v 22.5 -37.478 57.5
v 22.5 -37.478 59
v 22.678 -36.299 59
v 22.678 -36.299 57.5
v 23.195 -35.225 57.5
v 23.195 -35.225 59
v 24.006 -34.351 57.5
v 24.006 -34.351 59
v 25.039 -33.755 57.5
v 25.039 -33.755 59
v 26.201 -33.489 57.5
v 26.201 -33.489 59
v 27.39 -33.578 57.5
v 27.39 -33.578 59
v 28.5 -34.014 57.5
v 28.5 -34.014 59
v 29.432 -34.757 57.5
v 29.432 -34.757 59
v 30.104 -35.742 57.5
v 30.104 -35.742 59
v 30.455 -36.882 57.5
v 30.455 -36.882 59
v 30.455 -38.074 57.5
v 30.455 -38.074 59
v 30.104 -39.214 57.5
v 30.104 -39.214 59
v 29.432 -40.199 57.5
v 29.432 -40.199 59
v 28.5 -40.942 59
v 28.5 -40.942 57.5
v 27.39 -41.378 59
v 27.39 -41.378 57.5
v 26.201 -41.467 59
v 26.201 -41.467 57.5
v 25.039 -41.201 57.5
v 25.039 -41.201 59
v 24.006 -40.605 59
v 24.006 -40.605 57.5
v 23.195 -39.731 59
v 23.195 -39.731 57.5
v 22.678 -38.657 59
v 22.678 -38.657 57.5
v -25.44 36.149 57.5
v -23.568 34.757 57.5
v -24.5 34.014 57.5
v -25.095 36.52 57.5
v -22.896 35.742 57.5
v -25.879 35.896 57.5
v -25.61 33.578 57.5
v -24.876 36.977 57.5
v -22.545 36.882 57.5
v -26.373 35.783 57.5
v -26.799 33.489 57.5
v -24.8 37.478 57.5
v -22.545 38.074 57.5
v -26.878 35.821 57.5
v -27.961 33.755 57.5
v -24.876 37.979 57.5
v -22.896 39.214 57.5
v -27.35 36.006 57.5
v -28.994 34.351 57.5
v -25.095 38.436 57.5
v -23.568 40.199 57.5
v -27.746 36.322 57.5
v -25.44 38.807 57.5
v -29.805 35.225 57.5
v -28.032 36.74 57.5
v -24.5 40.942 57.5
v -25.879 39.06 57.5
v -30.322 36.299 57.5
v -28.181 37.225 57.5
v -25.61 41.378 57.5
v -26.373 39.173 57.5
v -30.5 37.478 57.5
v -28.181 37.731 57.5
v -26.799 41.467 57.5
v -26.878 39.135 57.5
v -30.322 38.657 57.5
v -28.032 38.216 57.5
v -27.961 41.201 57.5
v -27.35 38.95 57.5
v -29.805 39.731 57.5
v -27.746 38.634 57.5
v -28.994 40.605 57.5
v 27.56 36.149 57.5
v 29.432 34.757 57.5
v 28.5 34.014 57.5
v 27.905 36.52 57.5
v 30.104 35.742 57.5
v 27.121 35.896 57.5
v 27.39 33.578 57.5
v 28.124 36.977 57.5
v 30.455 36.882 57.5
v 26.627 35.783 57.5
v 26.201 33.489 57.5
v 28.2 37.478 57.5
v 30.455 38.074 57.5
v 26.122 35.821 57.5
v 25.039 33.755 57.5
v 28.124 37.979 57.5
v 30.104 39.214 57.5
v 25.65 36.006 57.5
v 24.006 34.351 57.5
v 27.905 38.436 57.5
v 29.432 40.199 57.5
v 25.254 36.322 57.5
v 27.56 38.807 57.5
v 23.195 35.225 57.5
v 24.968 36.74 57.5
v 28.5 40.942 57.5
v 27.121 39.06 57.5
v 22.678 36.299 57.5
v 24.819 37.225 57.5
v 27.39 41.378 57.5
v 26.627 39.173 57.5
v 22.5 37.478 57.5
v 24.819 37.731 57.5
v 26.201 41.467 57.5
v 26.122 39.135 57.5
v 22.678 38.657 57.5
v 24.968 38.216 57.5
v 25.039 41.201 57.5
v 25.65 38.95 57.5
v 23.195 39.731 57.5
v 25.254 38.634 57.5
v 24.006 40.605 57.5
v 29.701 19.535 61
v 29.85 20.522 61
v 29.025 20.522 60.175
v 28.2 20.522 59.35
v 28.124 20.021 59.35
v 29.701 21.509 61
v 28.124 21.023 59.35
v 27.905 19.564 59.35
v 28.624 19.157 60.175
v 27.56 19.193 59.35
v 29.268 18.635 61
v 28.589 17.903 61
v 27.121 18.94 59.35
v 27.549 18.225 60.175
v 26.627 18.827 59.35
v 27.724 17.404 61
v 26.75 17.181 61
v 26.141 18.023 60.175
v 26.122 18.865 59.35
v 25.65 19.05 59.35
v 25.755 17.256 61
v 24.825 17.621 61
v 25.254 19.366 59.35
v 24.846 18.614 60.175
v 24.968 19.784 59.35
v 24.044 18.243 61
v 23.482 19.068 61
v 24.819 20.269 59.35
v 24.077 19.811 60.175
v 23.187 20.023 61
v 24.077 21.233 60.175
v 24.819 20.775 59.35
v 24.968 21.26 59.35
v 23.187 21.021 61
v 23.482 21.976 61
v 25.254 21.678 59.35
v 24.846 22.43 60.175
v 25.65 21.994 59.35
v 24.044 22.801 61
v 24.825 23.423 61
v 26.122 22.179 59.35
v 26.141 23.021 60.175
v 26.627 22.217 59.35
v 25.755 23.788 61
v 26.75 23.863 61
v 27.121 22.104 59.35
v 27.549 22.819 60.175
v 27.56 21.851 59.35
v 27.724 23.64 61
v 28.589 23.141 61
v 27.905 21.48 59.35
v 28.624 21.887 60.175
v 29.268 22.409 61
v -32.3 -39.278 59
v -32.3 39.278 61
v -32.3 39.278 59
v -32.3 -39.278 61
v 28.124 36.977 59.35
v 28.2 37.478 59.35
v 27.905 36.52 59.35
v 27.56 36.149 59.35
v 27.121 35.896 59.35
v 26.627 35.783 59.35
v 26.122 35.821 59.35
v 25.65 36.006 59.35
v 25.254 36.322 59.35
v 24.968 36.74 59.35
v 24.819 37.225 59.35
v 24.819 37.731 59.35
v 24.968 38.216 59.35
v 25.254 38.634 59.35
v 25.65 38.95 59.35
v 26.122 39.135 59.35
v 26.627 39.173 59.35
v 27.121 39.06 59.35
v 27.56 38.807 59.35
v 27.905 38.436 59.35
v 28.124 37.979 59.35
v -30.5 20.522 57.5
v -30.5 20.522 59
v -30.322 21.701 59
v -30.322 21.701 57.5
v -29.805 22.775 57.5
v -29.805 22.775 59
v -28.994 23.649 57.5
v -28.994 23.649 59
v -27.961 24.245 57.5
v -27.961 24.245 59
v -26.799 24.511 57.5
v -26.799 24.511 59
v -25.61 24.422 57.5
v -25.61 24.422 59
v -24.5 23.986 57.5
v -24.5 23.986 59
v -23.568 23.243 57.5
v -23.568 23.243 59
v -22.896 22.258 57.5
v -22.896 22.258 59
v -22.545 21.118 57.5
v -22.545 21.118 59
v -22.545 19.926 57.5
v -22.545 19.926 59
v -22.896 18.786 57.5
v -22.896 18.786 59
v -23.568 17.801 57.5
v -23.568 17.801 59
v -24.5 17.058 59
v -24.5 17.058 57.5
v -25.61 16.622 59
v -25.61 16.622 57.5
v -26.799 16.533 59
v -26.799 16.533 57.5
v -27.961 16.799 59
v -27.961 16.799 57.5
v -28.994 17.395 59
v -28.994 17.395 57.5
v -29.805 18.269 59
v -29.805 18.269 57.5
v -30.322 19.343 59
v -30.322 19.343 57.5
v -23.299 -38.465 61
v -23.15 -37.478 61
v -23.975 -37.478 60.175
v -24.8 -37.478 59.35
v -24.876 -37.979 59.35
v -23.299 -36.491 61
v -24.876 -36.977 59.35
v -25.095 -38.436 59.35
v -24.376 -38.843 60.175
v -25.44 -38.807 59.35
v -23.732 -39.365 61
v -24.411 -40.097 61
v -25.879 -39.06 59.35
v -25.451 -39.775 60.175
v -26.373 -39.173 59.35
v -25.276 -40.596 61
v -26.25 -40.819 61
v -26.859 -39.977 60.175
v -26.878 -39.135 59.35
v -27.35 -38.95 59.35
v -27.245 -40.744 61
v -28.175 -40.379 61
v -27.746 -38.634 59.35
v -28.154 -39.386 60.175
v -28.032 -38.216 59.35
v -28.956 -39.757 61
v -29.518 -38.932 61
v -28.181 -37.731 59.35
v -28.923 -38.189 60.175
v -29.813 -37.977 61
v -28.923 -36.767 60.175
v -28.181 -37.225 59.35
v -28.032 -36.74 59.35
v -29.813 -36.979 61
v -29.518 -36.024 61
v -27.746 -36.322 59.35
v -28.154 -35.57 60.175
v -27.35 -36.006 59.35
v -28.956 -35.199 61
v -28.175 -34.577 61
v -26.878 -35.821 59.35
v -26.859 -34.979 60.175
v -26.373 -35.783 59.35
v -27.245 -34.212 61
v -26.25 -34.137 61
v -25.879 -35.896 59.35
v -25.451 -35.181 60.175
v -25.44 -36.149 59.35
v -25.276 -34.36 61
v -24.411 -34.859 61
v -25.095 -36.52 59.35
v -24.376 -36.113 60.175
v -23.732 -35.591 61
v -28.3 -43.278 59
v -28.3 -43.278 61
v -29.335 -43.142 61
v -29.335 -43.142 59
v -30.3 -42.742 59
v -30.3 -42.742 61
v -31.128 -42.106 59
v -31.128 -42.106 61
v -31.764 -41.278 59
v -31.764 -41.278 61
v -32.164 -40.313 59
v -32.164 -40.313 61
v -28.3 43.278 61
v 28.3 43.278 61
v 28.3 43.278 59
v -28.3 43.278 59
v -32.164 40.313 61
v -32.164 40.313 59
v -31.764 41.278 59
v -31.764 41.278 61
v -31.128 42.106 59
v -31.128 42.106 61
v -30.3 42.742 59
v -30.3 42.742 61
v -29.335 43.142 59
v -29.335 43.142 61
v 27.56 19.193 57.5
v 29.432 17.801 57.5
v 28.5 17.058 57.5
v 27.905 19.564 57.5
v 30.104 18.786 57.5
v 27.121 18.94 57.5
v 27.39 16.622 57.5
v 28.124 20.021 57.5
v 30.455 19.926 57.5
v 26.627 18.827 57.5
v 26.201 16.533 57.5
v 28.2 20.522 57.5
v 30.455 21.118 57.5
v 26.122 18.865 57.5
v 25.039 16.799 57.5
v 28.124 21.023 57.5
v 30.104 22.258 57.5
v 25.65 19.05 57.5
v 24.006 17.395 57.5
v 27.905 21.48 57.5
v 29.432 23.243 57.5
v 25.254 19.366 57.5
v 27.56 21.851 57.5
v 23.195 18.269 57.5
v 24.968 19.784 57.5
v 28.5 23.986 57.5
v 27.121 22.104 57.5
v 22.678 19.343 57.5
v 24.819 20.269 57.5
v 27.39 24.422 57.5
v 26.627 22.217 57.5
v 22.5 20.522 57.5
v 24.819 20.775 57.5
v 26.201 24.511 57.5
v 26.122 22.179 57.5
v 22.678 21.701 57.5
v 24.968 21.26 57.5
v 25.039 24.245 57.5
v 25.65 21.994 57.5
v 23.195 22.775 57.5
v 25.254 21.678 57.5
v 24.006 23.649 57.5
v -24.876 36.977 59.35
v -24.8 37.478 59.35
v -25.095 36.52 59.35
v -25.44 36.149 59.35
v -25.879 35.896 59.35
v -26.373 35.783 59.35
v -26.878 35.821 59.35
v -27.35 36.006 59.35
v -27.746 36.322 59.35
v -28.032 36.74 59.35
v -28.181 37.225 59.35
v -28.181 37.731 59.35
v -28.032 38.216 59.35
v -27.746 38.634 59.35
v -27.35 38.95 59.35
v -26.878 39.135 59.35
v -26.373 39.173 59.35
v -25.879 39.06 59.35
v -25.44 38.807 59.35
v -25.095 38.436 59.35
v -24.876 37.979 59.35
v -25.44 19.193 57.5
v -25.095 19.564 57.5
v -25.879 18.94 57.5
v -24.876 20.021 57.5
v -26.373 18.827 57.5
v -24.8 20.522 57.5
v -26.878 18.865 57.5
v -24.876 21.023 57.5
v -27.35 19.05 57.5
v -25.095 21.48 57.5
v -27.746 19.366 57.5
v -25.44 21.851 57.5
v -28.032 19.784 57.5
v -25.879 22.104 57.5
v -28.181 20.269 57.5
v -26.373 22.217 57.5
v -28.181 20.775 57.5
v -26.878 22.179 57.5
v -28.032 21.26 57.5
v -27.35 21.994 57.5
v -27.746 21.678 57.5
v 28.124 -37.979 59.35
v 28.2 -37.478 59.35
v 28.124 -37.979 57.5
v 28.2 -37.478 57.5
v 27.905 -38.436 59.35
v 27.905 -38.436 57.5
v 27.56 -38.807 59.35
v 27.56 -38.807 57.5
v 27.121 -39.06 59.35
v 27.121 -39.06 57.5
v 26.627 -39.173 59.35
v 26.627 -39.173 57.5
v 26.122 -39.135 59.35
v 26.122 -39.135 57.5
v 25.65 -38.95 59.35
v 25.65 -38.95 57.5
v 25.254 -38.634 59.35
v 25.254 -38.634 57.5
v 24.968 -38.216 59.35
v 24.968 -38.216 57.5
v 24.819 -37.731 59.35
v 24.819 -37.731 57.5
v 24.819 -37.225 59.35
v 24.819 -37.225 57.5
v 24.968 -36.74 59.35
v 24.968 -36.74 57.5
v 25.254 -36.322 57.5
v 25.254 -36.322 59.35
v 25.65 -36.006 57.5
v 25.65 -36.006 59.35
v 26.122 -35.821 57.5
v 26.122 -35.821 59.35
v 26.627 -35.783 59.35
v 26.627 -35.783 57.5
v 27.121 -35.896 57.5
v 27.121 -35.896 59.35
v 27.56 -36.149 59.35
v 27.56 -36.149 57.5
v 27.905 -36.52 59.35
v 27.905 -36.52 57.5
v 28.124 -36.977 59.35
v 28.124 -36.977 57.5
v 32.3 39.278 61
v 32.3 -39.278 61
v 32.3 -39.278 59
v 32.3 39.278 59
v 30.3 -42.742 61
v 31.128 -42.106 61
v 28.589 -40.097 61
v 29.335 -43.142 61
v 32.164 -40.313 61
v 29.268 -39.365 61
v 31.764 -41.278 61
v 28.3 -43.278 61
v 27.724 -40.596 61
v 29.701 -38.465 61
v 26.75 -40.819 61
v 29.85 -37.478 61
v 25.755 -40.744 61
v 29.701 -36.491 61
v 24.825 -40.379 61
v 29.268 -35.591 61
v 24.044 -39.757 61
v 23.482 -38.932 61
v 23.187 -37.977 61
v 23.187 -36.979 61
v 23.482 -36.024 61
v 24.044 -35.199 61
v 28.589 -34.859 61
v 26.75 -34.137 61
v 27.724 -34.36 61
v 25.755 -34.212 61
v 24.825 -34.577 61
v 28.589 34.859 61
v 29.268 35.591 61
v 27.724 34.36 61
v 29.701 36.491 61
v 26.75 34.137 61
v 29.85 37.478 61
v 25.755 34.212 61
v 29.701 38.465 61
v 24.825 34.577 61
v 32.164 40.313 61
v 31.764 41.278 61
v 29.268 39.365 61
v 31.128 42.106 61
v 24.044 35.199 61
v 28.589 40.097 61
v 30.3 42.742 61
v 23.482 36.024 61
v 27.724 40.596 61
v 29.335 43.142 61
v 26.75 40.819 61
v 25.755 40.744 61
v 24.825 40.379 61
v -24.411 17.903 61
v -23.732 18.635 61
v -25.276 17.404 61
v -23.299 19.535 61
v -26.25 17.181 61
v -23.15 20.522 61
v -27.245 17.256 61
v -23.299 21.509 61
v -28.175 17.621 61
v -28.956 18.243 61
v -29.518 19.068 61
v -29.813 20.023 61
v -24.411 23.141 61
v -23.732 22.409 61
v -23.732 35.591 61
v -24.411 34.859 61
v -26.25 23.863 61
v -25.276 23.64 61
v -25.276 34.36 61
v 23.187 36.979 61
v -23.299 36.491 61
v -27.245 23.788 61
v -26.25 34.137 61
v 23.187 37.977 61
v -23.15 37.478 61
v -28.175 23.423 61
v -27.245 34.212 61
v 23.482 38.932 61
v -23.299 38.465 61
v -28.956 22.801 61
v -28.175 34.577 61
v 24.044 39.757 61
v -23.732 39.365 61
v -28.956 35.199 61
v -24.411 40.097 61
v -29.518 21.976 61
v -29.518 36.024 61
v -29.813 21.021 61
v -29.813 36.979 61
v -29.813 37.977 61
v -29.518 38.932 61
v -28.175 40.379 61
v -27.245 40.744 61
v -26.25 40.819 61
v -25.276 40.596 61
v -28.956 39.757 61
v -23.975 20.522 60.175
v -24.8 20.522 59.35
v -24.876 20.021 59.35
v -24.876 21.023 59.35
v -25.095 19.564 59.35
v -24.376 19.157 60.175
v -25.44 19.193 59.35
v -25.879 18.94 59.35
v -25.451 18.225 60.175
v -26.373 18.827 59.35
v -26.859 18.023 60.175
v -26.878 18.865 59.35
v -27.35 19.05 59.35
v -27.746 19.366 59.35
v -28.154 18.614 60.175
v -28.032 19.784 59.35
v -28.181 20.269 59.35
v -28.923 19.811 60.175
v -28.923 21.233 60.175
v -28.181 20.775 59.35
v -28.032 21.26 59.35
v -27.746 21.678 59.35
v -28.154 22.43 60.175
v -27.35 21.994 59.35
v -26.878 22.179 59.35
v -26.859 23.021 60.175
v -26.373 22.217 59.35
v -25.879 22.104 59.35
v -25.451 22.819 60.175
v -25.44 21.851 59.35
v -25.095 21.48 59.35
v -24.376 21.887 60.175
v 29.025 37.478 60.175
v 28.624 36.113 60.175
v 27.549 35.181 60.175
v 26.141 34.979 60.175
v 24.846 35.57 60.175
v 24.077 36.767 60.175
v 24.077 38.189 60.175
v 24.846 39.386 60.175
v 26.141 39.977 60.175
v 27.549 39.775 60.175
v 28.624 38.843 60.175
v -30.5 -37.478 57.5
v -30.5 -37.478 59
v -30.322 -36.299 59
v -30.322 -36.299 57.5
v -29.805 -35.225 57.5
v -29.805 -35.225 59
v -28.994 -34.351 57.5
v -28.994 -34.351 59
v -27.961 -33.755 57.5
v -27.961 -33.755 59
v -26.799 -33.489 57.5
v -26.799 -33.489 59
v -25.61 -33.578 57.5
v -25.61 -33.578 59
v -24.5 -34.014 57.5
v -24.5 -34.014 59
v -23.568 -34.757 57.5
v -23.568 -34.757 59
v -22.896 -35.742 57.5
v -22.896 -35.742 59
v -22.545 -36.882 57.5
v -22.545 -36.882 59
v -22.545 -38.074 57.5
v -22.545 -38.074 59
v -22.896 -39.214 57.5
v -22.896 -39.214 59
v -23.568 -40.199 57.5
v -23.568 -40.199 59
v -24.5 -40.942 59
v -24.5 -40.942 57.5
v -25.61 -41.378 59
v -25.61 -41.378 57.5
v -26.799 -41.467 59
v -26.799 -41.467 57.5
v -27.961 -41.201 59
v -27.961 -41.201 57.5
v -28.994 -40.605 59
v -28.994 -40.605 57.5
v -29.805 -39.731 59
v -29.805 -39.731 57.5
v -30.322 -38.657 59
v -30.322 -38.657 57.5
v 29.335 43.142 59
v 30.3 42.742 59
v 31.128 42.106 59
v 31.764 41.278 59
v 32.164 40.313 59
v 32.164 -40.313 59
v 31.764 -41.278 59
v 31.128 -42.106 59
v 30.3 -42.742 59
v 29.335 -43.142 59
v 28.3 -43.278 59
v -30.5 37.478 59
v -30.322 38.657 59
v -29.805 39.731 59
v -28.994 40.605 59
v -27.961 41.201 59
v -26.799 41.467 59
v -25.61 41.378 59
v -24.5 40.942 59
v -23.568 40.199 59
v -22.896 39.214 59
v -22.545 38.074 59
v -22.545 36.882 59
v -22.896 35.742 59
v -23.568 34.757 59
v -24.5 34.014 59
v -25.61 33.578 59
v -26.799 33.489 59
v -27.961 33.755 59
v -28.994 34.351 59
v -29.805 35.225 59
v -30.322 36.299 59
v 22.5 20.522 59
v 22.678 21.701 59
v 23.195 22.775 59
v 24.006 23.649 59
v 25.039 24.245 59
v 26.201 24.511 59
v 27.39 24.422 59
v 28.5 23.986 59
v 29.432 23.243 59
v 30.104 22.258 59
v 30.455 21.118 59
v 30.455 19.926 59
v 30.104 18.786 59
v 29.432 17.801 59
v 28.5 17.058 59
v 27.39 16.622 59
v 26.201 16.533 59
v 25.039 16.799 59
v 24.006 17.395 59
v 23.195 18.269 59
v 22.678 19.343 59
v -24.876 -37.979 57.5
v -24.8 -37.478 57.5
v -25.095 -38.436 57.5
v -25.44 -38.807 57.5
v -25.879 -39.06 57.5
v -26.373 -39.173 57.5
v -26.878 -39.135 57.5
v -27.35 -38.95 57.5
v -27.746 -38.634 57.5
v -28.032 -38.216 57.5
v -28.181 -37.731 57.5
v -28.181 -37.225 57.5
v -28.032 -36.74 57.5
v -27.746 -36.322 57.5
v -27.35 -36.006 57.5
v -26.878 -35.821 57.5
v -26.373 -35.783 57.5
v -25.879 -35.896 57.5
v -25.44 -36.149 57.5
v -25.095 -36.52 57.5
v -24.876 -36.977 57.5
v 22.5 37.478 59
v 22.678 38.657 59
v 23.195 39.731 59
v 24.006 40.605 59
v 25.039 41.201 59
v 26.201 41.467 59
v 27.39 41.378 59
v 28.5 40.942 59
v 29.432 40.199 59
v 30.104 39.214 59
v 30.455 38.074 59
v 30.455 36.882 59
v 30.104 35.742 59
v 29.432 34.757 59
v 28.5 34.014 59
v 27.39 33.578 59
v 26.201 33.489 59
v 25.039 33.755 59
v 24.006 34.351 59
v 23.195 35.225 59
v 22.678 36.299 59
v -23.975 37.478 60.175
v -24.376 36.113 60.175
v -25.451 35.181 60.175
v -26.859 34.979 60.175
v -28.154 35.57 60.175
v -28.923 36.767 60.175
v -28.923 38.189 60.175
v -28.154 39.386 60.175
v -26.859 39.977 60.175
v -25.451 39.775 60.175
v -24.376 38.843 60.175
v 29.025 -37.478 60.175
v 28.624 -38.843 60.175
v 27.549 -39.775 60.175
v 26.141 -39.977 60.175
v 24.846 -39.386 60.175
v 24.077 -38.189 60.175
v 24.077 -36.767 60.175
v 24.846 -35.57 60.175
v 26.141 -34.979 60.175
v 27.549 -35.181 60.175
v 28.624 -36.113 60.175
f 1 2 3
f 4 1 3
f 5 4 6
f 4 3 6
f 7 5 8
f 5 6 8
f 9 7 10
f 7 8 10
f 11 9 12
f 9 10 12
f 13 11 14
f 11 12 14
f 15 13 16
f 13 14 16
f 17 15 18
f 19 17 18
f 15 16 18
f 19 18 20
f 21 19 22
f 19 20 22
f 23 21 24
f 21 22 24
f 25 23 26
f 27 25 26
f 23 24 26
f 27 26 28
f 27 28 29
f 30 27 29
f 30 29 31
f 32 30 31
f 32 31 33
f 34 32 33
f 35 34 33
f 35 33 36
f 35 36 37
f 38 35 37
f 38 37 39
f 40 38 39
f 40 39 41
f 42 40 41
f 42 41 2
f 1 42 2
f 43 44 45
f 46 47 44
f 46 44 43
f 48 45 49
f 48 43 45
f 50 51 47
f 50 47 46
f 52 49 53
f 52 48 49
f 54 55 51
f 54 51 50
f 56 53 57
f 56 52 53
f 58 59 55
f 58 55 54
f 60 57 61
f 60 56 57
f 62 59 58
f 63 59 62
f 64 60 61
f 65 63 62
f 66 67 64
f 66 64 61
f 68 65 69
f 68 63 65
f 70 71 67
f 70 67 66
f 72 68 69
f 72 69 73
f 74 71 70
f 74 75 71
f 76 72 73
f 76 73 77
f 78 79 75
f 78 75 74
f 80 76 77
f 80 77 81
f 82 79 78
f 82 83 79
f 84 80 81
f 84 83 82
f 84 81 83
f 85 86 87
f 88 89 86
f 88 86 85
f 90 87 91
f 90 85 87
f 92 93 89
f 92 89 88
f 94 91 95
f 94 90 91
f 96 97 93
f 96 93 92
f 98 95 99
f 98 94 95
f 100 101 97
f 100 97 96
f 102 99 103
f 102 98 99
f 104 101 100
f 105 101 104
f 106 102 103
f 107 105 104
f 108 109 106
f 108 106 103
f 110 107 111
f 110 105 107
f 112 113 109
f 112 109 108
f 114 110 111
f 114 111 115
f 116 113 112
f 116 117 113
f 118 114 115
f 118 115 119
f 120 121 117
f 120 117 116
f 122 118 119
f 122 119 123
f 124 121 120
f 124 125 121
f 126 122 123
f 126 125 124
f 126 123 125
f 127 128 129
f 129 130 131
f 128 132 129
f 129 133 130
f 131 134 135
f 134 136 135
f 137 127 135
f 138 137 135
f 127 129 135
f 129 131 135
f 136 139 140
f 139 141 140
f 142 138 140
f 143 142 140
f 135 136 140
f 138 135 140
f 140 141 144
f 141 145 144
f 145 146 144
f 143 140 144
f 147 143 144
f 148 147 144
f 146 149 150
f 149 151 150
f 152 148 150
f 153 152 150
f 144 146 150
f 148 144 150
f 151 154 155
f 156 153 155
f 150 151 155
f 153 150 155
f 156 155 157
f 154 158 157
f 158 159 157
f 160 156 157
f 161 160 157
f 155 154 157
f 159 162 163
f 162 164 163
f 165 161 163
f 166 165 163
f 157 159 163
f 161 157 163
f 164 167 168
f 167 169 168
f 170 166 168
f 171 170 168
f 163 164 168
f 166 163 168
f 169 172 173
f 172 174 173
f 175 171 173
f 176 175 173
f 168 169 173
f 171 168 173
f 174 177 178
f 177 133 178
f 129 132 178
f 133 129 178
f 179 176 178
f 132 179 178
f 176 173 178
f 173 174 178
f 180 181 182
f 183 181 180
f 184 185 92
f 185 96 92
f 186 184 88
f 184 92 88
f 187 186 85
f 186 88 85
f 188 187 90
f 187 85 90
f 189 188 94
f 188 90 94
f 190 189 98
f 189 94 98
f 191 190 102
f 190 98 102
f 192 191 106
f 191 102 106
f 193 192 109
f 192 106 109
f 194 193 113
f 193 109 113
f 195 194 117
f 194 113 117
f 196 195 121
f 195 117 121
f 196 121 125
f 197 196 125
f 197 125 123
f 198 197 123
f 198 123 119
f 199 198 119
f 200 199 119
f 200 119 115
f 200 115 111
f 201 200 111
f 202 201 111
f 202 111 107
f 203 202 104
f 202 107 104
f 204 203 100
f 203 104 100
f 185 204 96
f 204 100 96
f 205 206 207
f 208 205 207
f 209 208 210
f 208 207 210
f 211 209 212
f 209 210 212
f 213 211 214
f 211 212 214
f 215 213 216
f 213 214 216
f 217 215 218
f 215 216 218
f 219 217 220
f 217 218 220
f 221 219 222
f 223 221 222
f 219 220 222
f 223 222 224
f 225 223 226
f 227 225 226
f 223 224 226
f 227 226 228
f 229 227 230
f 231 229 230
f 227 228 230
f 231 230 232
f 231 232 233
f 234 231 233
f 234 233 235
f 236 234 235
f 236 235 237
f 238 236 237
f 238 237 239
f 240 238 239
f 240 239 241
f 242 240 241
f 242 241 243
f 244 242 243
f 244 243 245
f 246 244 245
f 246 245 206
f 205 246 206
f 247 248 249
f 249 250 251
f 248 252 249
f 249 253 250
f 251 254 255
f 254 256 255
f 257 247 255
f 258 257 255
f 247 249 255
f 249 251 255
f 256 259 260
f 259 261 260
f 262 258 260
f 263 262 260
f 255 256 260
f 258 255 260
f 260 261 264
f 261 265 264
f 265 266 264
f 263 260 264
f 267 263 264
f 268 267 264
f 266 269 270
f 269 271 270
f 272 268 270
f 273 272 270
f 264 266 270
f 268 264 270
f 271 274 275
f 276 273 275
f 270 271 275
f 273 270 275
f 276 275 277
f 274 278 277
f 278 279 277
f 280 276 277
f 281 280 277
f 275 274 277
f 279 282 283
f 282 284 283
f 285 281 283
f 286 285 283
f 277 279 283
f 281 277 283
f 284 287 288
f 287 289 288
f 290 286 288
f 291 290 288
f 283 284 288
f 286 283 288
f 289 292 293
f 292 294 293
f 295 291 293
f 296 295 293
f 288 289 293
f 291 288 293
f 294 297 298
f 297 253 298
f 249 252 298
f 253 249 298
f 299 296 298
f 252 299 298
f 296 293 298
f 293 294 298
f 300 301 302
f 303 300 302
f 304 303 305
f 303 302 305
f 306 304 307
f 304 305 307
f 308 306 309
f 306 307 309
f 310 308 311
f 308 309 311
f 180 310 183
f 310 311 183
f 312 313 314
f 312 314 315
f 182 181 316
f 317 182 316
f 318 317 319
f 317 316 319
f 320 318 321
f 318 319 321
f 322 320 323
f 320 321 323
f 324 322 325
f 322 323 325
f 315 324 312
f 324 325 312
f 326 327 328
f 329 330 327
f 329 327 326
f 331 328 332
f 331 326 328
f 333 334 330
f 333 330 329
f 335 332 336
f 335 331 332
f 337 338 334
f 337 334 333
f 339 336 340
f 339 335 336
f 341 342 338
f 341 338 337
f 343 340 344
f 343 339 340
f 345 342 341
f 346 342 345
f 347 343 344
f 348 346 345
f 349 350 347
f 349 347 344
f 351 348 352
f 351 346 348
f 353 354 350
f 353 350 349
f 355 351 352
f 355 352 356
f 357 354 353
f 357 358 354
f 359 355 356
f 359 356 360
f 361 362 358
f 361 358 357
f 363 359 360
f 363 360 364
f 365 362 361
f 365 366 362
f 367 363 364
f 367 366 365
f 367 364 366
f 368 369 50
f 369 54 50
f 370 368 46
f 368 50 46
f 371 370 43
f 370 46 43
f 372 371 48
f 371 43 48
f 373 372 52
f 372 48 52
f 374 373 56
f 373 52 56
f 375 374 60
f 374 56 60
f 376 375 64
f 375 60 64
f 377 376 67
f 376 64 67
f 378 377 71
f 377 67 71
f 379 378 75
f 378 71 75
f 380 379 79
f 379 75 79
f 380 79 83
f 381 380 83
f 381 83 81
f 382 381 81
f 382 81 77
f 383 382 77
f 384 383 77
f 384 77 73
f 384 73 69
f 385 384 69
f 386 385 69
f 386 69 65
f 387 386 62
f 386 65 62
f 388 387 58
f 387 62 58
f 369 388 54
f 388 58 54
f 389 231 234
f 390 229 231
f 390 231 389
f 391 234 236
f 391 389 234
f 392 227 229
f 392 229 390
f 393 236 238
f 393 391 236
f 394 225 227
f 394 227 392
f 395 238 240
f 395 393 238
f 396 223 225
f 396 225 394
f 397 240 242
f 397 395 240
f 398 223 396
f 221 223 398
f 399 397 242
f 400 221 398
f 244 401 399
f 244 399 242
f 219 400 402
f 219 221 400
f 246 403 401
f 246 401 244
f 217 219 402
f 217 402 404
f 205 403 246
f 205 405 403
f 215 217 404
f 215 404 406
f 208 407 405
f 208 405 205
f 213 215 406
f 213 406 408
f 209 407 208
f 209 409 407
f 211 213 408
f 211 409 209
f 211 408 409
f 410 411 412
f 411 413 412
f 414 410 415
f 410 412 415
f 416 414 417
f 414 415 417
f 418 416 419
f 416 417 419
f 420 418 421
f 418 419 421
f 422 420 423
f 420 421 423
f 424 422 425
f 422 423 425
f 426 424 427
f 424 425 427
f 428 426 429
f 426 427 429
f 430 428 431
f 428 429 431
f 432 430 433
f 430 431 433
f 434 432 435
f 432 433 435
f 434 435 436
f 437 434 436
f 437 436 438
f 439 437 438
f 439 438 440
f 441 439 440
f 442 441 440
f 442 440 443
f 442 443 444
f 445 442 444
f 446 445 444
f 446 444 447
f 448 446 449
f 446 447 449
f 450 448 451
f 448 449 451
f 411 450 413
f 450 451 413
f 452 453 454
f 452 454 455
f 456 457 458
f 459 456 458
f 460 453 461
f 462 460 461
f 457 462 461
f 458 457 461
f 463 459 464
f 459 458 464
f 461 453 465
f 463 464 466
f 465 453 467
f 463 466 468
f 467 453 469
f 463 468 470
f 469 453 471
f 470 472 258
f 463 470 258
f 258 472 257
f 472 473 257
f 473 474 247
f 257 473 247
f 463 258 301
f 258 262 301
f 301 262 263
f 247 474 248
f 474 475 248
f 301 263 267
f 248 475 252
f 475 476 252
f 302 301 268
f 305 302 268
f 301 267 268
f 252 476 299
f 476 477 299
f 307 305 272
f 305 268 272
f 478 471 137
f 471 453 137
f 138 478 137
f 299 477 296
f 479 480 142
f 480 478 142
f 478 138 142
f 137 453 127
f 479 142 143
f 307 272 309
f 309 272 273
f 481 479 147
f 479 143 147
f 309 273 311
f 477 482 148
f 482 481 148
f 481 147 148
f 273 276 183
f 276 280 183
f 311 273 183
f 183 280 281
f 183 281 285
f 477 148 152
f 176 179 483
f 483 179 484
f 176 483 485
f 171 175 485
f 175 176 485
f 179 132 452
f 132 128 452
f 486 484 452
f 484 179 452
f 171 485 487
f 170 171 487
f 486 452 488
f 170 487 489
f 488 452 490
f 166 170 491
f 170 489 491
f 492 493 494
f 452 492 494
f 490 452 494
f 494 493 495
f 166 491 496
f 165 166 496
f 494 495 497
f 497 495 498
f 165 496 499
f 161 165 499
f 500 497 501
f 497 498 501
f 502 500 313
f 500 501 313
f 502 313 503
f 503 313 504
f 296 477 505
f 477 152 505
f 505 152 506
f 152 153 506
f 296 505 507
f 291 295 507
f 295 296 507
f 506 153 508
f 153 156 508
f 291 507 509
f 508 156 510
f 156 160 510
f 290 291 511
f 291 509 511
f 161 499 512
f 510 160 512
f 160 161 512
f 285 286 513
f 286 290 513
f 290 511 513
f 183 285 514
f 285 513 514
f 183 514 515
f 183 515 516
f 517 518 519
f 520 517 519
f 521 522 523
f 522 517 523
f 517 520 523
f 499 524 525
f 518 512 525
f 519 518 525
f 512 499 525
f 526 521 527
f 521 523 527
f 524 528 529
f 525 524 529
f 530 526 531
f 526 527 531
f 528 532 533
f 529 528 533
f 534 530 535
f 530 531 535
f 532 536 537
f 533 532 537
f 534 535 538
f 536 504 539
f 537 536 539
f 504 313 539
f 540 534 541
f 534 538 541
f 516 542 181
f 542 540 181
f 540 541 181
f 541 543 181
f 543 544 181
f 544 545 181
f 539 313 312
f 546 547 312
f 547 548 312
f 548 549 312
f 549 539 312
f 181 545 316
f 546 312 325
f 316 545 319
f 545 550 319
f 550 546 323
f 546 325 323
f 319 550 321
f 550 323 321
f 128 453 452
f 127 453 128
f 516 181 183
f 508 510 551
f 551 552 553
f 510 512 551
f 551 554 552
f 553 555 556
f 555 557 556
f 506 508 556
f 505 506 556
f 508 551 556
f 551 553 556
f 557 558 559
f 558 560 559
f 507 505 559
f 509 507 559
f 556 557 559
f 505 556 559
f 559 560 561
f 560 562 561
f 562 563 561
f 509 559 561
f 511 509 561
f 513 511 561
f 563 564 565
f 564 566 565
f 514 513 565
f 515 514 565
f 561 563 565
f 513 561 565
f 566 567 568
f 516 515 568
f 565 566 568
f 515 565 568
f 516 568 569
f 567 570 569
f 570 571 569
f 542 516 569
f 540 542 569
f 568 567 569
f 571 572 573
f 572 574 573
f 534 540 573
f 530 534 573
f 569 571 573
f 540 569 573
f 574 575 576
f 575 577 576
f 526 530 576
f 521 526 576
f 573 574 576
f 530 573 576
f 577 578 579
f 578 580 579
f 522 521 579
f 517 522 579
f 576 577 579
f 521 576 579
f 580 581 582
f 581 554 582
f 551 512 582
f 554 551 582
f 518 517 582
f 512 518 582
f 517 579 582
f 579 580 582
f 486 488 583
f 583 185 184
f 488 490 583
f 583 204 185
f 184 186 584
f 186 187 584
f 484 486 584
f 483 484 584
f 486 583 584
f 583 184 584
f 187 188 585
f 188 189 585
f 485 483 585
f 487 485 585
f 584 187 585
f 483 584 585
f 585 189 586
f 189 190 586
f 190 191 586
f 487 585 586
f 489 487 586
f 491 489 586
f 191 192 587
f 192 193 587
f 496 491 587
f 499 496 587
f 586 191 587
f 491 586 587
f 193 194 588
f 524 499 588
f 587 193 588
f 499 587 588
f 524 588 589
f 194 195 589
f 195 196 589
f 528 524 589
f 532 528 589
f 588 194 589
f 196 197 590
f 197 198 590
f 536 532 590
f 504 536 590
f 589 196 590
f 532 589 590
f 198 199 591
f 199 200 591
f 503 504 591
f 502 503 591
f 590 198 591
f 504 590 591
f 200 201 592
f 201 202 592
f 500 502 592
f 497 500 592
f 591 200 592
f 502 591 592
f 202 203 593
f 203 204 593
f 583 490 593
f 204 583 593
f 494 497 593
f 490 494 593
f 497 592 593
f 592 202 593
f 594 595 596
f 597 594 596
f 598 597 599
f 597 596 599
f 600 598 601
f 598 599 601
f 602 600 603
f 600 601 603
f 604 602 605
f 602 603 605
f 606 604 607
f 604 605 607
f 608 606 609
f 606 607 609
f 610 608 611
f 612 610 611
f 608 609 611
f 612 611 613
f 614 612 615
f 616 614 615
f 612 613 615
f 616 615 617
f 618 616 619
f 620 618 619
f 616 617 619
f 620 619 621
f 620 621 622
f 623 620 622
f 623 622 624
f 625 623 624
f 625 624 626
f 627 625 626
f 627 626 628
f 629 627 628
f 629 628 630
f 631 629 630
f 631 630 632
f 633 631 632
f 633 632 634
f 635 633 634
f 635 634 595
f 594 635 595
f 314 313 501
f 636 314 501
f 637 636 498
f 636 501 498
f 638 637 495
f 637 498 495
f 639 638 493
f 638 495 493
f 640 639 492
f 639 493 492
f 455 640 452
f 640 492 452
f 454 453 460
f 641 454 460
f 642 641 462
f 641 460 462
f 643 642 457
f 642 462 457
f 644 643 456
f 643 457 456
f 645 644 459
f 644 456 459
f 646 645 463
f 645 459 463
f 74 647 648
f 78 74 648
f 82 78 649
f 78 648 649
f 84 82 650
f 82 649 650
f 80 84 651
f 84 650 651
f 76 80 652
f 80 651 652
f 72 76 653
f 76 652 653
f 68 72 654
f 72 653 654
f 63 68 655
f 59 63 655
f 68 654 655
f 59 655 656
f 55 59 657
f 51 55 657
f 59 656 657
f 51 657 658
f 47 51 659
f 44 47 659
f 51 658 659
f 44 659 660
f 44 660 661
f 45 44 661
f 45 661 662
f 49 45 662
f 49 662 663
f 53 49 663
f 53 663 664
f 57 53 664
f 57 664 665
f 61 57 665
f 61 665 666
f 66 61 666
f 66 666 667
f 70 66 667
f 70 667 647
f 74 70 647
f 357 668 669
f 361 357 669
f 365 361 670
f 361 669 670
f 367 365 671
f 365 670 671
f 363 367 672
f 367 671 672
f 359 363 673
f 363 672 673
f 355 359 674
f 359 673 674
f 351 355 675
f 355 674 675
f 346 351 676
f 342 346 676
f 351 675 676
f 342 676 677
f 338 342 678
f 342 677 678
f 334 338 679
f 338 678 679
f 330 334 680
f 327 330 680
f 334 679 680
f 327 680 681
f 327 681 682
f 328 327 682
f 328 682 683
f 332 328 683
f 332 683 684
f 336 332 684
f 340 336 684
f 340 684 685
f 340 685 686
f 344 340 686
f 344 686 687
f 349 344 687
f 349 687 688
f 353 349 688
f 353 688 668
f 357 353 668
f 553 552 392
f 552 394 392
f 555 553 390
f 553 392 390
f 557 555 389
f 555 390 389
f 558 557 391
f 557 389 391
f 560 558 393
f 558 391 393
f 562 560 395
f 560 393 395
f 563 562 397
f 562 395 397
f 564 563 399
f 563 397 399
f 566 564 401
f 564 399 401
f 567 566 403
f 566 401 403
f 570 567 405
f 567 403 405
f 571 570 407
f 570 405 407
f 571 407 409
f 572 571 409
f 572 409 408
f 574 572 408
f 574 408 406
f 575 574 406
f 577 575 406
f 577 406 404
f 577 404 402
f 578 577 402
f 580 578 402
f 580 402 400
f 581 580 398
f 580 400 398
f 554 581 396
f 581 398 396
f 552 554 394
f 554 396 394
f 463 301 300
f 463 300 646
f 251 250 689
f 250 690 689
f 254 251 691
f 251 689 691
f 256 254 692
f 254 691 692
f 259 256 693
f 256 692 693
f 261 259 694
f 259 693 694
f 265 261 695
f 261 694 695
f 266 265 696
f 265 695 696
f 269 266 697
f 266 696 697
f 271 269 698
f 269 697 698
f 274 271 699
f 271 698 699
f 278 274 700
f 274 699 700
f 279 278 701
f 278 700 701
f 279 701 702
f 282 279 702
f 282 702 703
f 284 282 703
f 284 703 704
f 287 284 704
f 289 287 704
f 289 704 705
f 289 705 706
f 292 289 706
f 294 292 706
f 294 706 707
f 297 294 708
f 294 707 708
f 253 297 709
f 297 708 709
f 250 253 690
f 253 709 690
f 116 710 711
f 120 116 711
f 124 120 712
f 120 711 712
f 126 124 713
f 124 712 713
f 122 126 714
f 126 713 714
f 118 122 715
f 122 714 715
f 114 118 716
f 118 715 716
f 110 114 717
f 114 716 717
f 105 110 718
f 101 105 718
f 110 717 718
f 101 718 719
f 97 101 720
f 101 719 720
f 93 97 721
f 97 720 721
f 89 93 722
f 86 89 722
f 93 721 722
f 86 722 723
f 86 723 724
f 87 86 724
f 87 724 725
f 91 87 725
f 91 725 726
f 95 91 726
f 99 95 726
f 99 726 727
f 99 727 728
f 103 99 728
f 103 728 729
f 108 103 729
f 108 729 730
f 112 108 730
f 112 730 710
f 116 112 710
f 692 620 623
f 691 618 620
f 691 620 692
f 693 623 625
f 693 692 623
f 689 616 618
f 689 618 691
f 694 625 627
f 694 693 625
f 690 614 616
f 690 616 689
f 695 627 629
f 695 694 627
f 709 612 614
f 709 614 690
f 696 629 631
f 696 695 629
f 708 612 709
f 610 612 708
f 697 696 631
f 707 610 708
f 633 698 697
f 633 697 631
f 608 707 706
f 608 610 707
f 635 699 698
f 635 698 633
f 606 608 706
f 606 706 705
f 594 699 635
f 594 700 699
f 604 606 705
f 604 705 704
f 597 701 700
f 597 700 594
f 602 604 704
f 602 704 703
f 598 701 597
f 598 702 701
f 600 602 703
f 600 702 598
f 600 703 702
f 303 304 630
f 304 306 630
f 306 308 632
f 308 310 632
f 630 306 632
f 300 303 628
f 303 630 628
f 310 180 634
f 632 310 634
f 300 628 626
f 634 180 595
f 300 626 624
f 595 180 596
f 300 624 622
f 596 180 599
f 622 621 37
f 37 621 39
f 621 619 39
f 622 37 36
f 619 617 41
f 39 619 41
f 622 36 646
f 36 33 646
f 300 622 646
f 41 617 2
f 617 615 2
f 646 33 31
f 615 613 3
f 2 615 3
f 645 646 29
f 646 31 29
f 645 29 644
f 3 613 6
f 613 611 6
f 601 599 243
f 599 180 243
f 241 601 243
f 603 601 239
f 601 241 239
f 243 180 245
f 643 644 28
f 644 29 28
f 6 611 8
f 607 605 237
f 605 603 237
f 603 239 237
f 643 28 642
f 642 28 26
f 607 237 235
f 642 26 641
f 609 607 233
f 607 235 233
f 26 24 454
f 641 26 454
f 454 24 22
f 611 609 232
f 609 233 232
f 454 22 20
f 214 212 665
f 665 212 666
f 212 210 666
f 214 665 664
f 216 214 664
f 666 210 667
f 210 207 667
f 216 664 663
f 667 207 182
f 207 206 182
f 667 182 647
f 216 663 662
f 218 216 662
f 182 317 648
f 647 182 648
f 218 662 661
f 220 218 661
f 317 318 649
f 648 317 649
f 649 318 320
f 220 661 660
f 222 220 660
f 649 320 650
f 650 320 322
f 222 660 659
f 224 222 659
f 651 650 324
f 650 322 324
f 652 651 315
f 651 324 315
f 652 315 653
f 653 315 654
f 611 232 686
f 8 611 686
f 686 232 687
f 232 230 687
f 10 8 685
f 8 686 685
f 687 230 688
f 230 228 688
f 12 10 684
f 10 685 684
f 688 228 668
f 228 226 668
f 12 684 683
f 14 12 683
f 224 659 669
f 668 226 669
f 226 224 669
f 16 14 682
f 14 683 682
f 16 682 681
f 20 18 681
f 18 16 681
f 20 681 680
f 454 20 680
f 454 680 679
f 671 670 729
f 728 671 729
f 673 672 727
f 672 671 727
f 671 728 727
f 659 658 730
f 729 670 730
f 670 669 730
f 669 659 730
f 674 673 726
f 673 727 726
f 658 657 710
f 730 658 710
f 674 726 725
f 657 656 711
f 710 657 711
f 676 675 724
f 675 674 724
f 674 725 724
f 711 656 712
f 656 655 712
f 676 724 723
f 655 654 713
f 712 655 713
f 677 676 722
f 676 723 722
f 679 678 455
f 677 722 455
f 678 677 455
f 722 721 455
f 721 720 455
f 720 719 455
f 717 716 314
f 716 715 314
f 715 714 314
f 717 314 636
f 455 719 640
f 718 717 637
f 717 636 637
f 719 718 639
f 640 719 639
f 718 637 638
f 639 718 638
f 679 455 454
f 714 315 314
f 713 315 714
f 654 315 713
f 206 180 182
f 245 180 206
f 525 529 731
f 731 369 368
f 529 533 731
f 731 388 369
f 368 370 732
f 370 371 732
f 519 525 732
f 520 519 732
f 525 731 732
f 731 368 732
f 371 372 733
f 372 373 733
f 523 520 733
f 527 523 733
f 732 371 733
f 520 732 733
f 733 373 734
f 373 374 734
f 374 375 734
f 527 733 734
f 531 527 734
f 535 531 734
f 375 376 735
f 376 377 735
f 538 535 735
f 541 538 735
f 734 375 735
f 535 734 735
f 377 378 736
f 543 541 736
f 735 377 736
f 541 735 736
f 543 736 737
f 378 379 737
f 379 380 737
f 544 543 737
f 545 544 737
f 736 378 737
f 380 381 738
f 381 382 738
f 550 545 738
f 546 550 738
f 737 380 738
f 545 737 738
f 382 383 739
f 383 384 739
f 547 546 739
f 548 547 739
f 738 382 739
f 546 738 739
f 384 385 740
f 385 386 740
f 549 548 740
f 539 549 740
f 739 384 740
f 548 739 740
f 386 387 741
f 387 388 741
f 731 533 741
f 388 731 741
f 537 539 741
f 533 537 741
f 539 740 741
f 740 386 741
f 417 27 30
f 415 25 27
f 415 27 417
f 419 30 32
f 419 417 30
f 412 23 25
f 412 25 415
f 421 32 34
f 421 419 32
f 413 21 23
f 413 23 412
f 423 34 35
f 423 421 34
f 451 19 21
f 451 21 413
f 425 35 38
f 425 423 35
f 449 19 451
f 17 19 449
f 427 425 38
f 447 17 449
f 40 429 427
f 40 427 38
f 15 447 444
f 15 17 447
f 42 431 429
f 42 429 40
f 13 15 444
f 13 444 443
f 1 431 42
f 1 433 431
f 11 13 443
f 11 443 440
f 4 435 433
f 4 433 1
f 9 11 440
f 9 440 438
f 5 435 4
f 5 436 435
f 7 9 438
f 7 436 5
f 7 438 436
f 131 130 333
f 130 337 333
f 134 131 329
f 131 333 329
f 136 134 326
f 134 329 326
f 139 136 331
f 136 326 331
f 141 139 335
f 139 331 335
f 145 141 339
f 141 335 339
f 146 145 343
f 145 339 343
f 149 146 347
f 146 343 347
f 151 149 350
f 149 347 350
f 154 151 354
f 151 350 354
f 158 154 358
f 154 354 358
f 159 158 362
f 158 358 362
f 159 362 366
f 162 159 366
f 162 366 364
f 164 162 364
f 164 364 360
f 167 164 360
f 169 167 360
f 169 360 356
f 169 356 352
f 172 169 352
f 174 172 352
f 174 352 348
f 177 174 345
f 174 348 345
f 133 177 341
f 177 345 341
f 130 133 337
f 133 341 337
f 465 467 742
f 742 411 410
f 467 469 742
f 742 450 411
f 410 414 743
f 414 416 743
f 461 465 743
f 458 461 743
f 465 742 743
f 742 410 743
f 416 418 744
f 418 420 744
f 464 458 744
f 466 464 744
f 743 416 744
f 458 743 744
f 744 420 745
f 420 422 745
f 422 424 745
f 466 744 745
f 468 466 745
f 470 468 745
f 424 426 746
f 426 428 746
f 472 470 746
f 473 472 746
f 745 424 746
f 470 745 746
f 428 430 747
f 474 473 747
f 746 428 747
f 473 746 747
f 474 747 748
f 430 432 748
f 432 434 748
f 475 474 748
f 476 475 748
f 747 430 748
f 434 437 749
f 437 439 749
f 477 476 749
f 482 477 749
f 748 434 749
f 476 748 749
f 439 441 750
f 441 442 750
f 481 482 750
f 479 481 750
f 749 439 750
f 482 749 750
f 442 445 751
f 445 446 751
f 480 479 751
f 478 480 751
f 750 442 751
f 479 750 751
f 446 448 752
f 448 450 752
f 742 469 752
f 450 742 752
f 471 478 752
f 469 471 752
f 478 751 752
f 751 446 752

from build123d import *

# Parameters (mm, degrees)
PAD013_DEPTH            = 2
SKETCH020_R             = 4
PAD014_DEPTH            = 3.5
HOLE_D                  = 3.4
HOLE_DEPTH              = 25
HOLE_CSINK_D            = 6.7
HOLE_CSINK_ANGLE        = 90
BODY004_PLACEMENT_ANGLE = 180


with BuildPart() as part:
    # Sketch019 → Pad013 (new body)
    with BuildSketch(Plane.XY):
        with BuildLine():
            Line((-32.3, -39.278), (-32.3, 39.278))
            ThreePointArc((-28.3, 43.278), (-31.128427, 42.106427), (-32.3, 39.278))
            Line((-28.3, 43.278), (28.3, 43.278))
            ThreePointArc((32.3, 39.278), (31.128427, 42.106427), (28.3, 43.278))
            Line((32.3, 39.278), (32.3, -39.278))
            ThreePointArc((28.3, -43.278), (31.128427, -42.106427), (32.3, -39.278))
            Line((28.3, -43.278), (-28.3, -43.278))
            ThreePointArc((-32.3, -39.278), (-31.128427, -42.106427), (-28.3, -43.278))
        make_face()
    extrude(amount=PAD013_DEPTH)

    # Sketch020 → Pad014 (join)
    with BuildSketch(Plane.XY):
        with Locations((-26.5, 37.478)):
            Circle(SKETCH020_R)
        with Locations((26.5, 37.478)):
            Circle(SKETCH020_R)
        with Locations((26.5, 20.522)):
            Circle(SKETCH020_R)
        with Locations((26.5, -37.478)):
            Circle(SKETCH020_R)
        with Locations((-26.5, -37.478)):
            Circle(SKETCH020_R)
        with Locations((-26.5, 20.522)):
            Circle(SKETCH020_R)
    extrude(amount=PAD014_DEPTH)

    # Hole
    with Locations(Plane(origin=(0, 0, 0), x_dir=(1, 0, 0), z_dir=(0, 0, -1))):
        with Locations((-26.5, -37.478), (26.5, -37.478), (26.5, -20.522), (26.5, 37.478), (-26.5, 37.478), (-26.5, -20.522)):
            CounterSinkHole(HOLE_D / 2, HOLE_CSINK_D / 2, depth=HOLE_DEPTH, counter_sink_angle=HOLE_CSINK_ANGLE)


with BuildPart() as part_1:
    # Body004 placement: moved
    add(part.part.moved(Location((0, 0, 61))).rotate(Axis((0, 0, 61), (0, 1, 0)), BODY004_PLACEMENT_ANGLE))


solid = part_1.part
